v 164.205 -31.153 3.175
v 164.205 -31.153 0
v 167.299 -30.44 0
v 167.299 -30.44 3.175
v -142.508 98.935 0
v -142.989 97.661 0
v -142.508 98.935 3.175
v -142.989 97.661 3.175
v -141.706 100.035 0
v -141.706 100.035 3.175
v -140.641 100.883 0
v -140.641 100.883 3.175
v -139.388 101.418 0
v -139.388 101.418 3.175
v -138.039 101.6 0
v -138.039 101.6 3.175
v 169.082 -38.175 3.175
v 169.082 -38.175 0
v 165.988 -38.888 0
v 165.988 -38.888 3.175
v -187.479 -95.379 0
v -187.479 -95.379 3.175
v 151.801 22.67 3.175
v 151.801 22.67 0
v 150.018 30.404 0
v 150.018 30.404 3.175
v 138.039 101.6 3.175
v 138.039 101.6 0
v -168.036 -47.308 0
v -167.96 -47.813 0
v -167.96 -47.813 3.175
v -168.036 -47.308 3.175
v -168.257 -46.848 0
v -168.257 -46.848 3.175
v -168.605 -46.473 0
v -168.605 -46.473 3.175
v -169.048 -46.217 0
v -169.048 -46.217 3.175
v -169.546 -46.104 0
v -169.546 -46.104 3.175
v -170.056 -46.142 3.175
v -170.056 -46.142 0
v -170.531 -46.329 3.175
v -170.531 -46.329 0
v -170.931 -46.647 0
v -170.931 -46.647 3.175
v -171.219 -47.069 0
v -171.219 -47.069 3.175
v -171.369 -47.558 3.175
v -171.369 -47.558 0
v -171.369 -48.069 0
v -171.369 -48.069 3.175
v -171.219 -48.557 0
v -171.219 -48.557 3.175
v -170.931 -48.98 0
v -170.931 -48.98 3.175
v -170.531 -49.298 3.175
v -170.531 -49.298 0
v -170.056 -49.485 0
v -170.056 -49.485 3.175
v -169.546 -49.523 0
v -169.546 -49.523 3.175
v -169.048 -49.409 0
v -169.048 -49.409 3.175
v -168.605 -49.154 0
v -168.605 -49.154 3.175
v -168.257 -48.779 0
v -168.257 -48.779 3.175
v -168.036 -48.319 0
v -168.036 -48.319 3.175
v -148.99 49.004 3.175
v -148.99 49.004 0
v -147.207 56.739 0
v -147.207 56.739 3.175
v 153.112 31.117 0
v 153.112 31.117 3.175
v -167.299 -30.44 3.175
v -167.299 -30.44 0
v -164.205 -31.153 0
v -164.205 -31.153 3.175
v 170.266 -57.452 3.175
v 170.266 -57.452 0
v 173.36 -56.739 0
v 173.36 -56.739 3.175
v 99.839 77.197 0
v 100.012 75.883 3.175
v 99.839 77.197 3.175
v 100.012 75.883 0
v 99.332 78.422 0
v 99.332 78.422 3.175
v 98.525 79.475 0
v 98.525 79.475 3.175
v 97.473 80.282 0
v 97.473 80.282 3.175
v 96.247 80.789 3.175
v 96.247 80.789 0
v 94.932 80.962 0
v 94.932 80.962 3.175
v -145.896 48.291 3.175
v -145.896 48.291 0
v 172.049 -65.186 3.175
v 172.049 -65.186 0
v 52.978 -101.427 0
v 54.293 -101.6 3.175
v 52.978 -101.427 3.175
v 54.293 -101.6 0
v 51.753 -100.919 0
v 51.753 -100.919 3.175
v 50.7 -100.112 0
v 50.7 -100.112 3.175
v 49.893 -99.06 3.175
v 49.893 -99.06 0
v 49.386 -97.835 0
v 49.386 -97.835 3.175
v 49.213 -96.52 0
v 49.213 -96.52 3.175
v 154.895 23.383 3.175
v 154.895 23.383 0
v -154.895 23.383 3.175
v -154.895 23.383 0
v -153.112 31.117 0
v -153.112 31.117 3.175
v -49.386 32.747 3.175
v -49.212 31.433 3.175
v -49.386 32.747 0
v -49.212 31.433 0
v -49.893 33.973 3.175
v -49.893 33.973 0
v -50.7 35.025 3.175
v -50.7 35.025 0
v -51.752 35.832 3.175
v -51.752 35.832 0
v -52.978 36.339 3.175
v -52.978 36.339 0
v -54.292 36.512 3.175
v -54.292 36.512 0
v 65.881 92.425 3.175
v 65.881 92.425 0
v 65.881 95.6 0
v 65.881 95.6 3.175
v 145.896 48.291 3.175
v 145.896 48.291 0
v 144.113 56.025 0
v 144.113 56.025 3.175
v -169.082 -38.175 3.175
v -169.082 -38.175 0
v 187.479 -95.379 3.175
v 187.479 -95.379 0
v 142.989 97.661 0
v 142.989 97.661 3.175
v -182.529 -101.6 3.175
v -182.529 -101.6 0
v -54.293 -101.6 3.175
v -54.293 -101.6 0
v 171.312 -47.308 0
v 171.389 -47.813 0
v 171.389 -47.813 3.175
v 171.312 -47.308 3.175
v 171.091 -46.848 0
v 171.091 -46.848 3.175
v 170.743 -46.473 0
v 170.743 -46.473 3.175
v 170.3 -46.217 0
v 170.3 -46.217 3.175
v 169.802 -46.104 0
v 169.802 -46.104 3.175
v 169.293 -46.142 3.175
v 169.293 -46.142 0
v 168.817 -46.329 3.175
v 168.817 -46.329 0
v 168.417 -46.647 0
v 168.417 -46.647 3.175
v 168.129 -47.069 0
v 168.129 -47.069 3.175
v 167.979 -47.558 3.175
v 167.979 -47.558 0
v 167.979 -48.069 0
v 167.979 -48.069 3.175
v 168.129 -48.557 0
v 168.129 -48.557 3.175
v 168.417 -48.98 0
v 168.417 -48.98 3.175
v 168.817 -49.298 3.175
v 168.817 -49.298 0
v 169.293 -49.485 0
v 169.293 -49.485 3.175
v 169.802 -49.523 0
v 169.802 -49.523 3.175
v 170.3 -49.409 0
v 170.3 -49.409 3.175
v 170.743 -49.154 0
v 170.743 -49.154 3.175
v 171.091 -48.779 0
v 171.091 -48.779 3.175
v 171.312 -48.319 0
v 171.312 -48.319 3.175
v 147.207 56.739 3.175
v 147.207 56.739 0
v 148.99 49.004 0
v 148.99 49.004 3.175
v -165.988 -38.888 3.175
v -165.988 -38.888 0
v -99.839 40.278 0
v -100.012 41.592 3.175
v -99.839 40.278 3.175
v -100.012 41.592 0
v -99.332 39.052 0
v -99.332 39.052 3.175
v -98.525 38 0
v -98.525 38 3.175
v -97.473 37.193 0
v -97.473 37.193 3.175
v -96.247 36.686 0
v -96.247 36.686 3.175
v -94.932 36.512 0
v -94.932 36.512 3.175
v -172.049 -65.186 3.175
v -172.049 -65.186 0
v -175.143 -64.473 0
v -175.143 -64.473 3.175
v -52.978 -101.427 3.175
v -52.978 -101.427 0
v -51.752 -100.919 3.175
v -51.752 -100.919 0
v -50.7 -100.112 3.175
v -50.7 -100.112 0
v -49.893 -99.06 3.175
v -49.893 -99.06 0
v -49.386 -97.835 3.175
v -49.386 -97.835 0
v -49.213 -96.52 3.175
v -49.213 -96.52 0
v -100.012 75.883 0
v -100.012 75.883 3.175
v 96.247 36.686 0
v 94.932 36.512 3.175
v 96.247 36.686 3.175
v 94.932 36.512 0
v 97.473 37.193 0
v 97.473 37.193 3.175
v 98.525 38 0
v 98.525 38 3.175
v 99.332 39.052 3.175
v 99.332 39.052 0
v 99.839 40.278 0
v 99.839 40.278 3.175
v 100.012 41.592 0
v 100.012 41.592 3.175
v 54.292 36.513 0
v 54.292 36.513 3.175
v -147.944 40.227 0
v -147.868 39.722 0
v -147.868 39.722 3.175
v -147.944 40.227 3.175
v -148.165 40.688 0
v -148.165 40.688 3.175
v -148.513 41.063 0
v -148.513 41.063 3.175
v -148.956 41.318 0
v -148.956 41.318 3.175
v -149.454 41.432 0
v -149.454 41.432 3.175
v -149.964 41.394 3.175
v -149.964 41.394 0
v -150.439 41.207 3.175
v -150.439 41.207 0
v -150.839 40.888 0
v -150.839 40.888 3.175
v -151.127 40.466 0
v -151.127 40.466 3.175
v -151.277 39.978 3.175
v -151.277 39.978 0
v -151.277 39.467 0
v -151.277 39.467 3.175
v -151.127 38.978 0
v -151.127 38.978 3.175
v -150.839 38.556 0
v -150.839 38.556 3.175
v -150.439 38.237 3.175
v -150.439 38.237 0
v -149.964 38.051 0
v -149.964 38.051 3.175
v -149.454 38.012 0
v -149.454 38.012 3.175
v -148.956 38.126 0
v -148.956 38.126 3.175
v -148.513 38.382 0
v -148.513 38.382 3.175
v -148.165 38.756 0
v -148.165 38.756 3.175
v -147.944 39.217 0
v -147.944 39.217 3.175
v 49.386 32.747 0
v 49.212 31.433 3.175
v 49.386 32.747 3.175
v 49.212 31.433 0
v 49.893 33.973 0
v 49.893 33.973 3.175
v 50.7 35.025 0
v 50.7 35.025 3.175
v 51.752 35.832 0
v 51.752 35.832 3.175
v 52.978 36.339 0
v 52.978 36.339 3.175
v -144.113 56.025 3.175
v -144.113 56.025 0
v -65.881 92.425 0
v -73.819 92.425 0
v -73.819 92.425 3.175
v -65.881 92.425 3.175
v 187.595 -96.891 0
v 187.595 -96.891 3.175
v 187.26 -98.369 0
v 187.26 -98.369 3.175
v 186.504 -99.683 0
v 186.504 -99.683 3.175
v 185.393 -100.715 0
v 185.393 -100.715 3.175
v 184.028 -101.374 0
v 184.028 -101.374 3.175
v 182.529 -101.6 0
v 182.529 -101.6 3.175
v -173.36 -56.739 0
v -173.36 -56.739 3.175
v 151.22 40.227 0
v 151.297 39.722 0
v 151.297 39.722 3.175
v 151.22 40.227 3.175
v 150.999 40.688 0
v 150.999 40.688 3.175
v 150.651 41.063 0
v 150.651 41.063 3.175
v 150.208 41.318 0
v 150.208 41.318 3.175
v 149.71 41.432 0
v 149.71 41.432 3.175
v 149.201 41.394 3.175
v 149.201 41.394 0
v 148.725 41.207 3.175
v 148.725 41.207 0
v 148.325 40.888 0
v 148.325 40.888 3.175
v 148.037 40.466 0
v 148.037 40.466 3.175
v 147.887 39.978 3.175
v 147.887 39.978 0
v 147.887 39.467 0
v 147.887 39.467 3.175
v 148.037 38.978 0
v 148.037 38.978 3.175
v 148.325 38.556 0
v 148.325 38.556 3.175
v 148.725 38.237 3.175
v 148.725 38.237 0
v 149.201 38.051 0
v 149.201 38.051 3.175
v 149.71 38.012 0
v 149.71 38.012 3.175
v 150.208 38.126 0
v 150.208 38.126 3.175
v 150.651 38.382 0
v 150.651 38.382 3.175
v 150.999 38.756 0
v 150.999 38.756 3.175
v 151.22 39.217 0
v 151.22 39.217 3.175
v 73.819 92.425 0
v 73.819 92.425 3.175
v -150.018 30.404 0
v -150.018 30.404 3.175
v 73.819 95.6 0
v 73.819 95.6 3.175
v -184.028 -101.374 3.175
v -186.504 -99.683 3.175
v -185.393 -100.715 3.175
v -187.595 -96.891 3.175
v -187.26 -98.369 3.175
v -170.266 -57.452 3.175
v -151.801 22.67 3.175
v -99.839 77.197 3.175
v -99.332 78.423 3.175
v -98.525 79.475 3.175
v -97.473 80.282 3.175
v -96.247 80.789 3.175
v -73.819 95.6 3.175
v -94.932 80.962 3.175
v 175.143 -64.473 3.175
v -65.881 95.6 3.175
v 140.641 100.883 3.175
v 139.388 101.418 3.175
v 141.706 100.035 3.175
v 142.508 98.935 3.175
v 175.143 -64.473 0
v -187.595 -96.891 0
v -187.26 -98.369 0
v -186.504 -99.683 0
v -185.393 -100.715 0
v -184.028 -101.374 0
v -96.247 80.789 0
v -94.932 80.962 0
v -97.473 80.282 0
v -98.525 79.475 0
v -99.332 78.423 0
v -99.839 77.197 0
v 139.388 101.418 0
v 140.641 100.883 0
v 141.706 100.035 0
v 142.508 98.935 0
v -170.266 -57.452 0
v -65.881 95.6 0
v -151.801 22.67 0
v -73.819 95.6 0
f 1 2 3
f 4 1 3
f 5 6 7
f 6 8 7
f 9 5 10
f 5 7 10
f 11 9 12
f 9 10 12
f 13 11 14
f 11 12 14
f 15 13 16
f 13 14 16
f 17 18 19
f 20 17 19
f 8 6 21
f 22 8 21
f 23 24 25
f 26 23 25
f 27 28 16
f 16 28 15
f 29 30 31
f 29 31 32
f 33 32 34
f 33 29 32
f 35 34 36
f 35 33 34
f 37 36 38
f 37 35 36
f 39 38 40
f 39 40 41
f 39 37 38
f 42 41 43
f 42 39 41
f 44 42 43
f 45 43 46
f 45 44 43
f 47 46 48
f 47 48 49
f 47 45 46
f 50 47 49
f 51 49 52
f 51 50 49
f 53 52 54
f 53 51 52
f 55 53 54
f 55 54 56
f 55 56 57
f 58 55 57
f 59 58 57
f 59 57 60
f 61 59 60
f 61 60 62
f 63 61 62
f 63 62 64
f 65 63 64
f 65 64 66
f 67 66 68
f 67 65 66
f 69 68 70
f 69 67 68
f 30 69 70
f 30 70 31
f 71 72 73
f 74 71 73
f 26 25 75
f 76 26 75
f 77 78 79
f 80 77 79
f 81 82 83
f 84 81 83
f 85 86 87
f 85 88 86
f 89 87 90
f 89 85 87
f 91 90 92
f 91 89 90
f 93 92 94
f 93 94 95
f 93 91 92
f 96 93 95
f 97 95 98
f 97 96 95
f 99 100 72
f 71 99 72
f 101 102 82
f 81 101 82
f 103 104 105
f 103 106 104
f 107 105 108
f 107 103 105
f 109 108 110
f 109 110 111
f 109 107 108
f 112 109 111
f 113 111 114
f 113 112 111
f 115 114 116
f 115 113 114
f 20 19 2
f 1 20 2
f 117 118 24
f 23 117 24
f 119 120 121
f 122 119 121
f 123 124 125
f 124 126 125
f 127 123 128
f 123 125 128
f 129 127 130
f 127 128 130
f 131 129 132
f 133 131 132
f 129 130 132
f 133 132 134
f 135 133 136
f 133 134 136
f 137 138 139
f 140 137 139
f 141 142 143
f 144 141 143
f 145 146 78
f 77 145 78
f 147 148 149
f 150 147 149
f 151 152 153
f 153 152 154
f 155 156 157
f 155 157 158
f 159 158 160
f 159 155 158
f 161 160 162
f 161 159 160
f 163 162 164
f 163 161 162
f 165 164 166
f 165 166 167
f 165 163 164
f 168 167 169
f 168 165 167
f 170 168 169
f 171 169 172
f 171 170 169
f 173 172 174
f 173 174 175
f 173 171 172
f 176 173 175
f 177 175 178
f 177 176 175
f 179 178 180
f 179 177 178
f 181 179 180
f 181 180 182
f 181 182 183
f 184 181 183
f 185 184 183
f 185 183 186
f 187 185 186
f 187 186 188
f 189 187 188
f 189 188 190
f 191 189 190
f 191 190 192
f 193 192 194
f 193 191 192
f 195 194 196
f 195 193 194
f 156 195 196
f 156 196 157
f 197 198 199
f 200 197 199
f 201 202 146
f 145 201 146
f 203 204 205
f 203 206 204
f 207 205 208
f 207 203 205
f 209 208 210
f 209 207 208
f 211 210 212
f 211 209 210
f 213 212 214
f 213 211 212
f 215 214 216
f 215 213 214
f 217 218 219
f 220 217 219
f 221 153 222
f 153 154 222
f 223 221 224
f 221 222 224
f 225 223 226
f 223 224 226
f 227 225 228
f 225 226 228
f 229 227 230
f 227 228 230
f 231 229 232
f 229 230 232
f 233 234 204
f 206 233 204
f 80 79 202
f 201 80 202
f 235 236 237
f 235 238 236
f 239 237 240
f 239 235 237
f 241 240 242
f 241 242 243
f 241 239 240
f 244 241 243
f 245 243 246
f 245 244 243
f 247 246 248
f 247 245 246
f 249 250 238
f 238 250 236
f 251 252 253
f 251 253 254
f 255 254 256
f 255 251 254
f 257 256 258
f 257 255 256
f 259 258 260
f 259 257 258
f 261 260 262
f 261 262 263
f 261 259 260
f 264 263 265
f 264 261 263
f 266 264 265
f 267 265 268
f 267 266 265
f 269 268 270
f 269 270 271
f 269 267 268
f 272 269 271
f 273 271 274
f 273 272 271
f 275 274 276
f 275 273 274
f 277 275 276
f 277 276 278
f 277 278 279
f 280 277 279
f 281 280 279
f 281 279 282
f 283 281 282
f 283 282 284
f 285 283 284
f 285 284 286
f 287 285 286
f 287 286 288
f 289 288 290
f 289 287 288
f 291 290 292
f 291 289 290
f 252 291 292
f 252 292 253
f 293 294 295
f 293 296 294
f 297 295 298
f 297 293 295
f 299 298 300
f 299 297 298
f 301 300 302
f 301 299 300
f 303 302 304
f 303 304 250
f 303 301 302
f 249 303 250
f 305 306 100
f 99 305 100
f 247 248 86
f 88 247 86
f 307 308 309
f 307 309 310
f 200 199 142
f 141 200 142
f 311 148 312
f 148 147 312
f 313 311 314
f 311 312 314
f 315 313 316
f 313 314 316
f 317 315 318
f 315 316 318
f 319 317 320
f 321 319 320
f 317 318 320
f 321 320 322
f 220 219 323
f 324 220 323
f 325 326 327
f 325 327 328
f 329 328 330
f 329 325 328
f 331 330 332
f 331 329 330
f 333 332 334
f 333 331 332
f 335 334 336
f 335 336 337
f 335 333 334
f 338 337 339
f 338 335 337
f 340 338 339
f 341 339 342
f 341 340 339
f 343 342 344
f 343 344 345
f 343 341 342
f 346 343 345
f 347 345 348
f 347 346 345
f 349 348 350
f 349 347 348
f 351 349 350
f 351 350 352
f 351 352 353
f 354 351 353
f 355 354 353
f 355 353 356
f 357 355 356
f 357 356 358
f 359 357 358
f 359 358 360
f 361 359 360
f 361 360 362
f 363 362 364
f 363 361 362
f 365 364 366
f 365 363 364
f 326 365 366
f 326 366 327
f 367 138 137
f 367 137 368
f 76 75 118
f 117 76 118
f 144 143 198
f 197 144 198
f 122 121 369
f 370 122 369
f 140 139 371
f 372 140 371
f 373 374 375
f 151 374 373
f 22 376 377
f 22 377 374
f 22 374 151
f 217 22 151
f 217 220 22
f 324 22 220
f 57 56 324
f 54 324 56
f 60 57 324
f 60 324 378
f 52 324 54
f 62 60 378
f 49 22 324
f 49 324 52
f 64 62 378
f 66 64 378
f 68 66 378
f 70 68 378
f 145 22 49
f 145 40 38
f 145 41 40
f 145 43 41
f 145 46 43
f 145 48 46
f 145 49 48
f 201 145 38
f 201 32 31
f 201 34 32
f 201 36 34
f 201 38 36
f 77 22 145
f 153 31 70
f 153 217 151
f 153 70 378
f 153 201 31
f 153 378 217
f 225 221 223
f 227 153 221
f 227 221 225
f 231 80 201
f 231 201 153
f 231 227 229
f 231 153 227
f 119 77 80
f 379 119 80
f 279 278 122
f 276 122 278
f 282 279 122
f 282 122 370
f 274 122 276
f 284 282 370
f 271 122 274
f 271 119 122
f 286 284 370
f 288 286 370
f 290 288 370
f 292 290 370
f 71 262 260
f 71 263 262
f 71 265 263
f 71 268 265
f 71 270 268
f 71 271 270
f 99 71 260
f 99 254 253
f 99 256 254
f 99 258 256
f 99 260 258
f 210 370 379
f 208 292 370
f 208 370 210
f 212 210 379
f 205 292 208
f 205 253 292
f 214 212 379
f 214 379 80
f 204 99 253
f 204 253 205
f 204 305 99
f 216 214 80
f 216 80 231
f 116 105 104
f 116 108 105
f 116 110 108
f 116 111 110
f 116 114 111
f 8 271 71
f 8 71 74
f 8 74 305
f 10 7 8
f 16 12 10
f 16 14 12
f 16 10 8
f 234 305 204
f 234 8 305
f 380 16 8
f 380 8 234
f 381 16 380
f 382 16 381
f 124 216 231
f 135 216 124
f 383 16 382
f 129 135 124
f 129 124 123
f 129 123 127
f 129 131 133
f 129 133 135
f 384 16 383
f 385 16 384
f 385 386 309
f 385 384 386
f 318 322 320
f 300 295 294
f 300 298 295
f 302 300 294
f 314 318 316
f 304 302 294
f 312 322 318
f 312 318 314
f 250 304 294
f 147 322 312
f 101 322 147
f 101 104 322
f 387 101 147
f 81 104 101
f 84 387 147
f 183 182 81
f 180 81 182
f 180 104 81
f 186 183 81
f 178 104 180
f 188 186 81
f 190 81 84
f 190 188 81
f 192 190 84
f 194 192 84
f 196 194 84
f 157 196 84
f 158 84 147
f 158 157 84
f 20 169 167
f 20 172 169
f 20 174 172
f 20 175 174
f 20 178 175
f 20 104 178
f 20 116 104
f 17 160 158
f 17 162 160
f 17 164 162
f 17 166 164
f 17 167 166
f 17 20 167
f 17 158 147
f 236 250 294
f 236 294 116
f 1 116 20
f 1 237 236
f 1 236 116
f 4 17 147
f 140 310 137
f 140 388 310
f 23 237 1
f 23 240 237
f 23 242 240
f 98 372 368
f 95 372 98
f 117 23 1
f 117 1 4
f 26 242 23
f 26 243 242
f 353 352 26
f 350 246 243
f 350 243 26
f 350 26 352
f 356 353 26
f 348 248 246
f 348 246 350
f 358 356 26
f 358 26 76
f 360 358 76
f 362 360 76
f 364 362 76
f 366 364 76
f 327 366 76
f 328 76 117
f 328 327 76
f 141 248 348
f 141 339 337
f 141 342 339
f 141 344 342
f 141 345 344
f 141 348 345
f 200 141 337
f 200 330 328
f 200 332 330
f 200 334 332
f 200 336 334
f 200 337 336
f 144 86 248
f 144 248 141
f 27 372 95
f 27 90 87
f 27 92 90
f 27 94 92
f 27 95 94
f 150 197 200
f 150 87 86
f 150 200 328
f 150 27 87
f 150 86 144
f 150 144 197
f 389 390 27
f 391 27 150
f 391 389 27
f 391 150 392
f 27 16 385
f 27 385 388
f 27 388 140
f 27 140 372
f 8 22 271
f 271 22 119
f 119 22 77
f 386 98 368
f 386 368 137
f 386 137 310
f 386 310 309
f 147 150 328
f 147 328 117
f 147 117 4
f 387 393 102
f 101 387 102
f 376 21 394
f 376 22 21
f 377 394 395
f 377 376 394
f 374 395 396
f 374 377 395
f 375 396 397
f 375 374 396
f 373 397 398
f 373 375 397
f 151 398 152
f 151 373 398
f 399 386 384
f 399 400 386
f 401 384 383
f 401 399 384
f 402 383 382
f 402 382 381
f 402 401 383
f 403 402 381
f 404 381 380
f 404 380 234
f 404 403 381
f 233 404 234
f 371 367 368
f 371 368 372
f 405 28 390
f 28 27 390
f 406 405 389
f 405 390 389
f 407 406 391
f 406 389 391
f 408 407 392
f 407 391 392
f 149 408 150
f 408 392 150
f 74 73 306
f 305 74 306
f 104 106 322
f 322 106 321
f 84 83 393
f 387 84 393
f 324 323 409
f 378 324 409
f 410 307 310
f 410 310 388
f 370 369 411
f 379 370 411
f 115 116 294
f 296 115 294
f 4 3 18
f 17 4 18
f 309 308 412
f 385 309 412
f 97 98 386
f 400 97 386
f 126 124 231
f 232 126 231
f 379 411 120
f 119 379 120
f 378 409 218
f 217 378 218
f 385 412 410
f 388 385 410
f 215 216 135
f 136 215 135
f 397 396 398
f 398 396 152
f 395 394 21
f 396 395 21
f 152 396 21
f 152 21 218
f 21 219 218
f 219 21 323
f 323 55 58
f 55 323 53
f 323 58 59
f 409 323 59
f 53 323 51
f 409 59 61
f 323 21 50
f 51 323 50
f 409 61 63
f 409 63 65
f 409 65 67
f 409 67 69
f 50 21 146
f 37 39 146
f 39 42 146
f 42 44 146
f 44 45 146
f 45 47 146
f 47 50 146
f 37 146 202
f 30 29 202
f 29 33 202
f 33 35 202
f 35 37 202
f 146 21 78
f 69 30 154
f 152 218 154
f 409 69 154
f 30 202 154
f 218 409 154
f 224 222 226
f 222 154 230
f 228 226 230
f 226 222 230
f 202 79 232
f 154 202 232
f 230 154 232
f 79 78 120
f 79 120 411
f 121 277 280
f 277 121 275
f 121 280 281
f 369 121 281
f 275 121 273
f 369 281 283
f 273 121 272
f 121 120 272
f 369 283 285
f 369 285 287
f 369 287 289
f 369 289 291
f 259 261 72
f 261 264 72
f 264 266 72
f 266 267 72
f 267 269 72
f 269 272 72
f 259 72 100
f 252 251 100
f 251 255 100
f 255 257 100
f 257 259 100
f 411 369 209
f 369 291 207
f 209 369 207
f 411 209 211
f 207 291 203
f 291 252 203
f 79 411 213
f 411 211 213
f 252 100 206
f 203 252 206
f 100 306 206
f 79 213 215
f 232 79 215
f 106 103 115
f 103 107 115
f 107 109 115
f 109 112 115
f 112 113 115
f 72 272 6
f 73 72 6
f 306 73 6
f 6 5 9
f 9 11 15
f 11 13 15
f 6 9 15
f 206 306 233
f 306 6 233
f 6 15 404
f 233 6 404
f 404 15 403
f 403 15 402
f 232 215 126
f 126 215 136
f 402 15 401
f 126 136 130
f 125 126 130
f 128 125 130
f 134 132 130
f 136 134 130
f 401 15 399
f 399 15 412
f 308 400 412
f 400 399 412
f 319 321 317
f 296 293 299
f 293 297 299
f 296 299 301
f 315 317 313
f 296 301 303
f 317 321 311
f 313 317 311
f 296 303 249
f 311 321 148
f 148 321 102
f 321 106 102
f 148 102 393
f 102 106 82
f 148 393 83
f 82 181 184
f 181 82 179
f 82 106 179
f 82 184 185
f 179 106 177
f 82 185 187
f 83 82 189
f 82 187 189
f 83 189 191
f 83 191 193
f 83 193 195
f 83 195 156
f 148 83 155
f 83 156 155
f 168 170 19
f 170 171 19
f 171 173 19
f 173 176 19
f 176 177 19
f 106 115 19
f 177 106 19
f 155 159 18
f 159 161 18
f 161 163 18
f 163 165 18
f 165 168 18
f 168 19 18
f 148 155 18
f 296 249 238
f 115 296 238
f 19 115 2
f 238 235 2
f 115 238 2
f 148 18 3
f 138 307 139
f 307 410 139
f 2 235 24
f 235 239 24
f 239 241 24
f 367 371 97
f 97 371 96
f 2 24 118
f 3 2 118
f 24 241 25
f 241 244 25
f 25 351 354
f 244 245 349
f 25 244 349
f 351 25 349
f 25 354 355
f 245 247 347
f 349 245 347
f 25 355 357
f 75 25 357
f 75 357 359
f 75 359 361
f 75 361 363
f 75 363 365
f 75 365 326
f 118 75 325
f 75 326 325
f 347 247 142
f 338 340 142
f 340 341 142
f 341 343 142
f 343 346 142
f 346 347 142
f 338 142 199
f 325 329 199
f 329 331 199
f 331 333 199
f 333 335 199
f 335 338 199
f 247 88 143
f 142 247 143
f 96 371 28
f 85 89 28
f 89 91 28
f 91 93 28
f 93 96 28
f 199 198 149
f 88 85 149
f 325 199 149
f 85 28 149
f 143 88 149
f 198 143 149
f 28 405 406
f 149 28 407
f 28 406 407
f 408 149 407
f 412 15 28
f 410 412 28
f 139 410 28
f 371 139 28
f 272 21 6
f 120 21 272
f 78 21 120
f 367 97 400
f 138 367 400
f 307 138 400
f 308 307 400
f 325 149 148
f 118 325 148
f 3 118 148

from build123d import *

# Parameters (mm, degrees)
F0_R     = 1.7145
F0_W     = 7.9375
F0_H     = 3.175
F1_DEPTH = 3.175
F3_DEPTH = 3.176
F4_R     = 5.08


with BuildPart() as f1:
    # F0 (on Top) → F1 (new body)
    with BuildSketch(Plane.XY):
        Polygon((-142.08125, 101.6), (-188.9125, -101.6), (188.9125, -101.6), (142.08125, 101.6), align=None)
        Polygon((-172.0488805663, -65.1862989442), (-175.1427761754, -64.4732526906), (-173.3601605412, -56.7385136678), (-170.2662649321, -57.4515599214), align=None, mode=Mode.SUBTRACT)
        with Locations((-169.6740739757, -47.8133499672)):
            Circle(F0_R, mode=Mode.SUBTRACT)
        Polygon((-169.0818830192, -38.175140013), (-167.2992673851, -30.4404009902), (-164.205371776, -31.1534472439), (-165.9879874101, -38.8881862667), align=None, mode=Mode.SUBTRACT)
        Polygon((172.0488805663, -65.1862989442), (170.2662649321, -57.4515599214), (173.3601605412, -56.7385136678), (175.1427761754, -64.4732526906), align=None, mode=Mode.SUBTRACT)
        with Locations((169.6740739757, -47.8133499672)):
            Circle(F0_R, mode=Mode.SUBTRACT)
        Polygon((167.2992673851, -30.4404009902), (169.0818830192, -38.175140013), (165.9879874101, -38.8881862667), (164.205371776, -31.1534472439), align=None, mode=Mode.SUBTRACT)
        Polygon((-150.0182030992, 30.4044371841), (-151.8008187334, 22.6696981613), (-154.8947143425, 23.3827444149), (-153.1120987083, 31.1174834377), align=None, mode=Mode.SUBTRACT)
        with Locations((-149.5820584881, 39.7220878176)):
            Circle(F0_R, mode=Mode.SUBTRACT)
        Polygon((-145.8959719225, 48.2907283913), (-148.9898675317, 49.003774645), (-147.2072518975, 56.7385136678), (-144.1133562884, 56.0254674141), align=None, mode=Mode.SUBTRACT)
        with Locations((-69.85, 94.0125)):
            Rectangle(F0_W, F0_H, mode=Mode.SUBTRACT)
        Polygon((150.0182030992, 30.4044371841), (153.1120987083, 31.1174834377), (154.8947143425, 23.3827444149), (151.8008187334, 22.6696981613), align=None, mode=Mode.SUBTRACT)
        with Locations((149.5820584881, 39.7220878176)):
            Circle(F0_R, mode=Mode.SUBTRACT)
        with Locations((69.85, 94.0125)):
            Rectangle(F0_W, F0_H, mode=Mode.SUBTRACT)
        Polygon((145.8959719225, 48.2907283913), (144.1133562884, 56.0254674141), (147.2072518975, 56.7385136678), (148.9898675317, 49.003774645), align=None, mode=Mode.SUBTRACT)
    extrude(amount=F1_DEPTH)

    # F2 (on face) → F3 (cut, through all)
    with BuildSketch(Plane.XY.offset(3.175)):
        Polygon((0, 80.9625), (-100.0125, 80.9625), (-100.0125, 36.5125), (-49.2125, 36.5125), (-49.2125, -101.6), (0, -101.6), (49.2125, -101.6), (49.2125, 36.5125), (100.0125, 36.5125), (100.0125, 80.9625), align=None)
    extrude(amount=-F3_DEPTH, mode=Mode.SUBTRACT)

    # F4
    f4_edges = [f1.edges().sort_by_distance(p)[0] for p in [
        (-142.08125, 101.6, 1.5875),
        (-188.9125, -101.6, 1.5875),
        (142.08125, 101.6, 1.5875),
        (188.9125, -101.6, 1.5875),
        (-49.2125, -101.6, 1.5875),
        (49.2125, -101.6, 1.5875),
        (-100.0125, 80.9625, 1.5875),
        (-49.2125, 36.5125, 1.5875),
        (-100.0125, 36.5125, 1.5875),
        (49.2125, 36.5125, 1.5875),
        (100.0125, 80.9625, 1.5875),
        (100.0125, 36.5125, 1.5875),
    ]]
    fillet(f4_edges, radius=F4_R)


solid = f1.part
